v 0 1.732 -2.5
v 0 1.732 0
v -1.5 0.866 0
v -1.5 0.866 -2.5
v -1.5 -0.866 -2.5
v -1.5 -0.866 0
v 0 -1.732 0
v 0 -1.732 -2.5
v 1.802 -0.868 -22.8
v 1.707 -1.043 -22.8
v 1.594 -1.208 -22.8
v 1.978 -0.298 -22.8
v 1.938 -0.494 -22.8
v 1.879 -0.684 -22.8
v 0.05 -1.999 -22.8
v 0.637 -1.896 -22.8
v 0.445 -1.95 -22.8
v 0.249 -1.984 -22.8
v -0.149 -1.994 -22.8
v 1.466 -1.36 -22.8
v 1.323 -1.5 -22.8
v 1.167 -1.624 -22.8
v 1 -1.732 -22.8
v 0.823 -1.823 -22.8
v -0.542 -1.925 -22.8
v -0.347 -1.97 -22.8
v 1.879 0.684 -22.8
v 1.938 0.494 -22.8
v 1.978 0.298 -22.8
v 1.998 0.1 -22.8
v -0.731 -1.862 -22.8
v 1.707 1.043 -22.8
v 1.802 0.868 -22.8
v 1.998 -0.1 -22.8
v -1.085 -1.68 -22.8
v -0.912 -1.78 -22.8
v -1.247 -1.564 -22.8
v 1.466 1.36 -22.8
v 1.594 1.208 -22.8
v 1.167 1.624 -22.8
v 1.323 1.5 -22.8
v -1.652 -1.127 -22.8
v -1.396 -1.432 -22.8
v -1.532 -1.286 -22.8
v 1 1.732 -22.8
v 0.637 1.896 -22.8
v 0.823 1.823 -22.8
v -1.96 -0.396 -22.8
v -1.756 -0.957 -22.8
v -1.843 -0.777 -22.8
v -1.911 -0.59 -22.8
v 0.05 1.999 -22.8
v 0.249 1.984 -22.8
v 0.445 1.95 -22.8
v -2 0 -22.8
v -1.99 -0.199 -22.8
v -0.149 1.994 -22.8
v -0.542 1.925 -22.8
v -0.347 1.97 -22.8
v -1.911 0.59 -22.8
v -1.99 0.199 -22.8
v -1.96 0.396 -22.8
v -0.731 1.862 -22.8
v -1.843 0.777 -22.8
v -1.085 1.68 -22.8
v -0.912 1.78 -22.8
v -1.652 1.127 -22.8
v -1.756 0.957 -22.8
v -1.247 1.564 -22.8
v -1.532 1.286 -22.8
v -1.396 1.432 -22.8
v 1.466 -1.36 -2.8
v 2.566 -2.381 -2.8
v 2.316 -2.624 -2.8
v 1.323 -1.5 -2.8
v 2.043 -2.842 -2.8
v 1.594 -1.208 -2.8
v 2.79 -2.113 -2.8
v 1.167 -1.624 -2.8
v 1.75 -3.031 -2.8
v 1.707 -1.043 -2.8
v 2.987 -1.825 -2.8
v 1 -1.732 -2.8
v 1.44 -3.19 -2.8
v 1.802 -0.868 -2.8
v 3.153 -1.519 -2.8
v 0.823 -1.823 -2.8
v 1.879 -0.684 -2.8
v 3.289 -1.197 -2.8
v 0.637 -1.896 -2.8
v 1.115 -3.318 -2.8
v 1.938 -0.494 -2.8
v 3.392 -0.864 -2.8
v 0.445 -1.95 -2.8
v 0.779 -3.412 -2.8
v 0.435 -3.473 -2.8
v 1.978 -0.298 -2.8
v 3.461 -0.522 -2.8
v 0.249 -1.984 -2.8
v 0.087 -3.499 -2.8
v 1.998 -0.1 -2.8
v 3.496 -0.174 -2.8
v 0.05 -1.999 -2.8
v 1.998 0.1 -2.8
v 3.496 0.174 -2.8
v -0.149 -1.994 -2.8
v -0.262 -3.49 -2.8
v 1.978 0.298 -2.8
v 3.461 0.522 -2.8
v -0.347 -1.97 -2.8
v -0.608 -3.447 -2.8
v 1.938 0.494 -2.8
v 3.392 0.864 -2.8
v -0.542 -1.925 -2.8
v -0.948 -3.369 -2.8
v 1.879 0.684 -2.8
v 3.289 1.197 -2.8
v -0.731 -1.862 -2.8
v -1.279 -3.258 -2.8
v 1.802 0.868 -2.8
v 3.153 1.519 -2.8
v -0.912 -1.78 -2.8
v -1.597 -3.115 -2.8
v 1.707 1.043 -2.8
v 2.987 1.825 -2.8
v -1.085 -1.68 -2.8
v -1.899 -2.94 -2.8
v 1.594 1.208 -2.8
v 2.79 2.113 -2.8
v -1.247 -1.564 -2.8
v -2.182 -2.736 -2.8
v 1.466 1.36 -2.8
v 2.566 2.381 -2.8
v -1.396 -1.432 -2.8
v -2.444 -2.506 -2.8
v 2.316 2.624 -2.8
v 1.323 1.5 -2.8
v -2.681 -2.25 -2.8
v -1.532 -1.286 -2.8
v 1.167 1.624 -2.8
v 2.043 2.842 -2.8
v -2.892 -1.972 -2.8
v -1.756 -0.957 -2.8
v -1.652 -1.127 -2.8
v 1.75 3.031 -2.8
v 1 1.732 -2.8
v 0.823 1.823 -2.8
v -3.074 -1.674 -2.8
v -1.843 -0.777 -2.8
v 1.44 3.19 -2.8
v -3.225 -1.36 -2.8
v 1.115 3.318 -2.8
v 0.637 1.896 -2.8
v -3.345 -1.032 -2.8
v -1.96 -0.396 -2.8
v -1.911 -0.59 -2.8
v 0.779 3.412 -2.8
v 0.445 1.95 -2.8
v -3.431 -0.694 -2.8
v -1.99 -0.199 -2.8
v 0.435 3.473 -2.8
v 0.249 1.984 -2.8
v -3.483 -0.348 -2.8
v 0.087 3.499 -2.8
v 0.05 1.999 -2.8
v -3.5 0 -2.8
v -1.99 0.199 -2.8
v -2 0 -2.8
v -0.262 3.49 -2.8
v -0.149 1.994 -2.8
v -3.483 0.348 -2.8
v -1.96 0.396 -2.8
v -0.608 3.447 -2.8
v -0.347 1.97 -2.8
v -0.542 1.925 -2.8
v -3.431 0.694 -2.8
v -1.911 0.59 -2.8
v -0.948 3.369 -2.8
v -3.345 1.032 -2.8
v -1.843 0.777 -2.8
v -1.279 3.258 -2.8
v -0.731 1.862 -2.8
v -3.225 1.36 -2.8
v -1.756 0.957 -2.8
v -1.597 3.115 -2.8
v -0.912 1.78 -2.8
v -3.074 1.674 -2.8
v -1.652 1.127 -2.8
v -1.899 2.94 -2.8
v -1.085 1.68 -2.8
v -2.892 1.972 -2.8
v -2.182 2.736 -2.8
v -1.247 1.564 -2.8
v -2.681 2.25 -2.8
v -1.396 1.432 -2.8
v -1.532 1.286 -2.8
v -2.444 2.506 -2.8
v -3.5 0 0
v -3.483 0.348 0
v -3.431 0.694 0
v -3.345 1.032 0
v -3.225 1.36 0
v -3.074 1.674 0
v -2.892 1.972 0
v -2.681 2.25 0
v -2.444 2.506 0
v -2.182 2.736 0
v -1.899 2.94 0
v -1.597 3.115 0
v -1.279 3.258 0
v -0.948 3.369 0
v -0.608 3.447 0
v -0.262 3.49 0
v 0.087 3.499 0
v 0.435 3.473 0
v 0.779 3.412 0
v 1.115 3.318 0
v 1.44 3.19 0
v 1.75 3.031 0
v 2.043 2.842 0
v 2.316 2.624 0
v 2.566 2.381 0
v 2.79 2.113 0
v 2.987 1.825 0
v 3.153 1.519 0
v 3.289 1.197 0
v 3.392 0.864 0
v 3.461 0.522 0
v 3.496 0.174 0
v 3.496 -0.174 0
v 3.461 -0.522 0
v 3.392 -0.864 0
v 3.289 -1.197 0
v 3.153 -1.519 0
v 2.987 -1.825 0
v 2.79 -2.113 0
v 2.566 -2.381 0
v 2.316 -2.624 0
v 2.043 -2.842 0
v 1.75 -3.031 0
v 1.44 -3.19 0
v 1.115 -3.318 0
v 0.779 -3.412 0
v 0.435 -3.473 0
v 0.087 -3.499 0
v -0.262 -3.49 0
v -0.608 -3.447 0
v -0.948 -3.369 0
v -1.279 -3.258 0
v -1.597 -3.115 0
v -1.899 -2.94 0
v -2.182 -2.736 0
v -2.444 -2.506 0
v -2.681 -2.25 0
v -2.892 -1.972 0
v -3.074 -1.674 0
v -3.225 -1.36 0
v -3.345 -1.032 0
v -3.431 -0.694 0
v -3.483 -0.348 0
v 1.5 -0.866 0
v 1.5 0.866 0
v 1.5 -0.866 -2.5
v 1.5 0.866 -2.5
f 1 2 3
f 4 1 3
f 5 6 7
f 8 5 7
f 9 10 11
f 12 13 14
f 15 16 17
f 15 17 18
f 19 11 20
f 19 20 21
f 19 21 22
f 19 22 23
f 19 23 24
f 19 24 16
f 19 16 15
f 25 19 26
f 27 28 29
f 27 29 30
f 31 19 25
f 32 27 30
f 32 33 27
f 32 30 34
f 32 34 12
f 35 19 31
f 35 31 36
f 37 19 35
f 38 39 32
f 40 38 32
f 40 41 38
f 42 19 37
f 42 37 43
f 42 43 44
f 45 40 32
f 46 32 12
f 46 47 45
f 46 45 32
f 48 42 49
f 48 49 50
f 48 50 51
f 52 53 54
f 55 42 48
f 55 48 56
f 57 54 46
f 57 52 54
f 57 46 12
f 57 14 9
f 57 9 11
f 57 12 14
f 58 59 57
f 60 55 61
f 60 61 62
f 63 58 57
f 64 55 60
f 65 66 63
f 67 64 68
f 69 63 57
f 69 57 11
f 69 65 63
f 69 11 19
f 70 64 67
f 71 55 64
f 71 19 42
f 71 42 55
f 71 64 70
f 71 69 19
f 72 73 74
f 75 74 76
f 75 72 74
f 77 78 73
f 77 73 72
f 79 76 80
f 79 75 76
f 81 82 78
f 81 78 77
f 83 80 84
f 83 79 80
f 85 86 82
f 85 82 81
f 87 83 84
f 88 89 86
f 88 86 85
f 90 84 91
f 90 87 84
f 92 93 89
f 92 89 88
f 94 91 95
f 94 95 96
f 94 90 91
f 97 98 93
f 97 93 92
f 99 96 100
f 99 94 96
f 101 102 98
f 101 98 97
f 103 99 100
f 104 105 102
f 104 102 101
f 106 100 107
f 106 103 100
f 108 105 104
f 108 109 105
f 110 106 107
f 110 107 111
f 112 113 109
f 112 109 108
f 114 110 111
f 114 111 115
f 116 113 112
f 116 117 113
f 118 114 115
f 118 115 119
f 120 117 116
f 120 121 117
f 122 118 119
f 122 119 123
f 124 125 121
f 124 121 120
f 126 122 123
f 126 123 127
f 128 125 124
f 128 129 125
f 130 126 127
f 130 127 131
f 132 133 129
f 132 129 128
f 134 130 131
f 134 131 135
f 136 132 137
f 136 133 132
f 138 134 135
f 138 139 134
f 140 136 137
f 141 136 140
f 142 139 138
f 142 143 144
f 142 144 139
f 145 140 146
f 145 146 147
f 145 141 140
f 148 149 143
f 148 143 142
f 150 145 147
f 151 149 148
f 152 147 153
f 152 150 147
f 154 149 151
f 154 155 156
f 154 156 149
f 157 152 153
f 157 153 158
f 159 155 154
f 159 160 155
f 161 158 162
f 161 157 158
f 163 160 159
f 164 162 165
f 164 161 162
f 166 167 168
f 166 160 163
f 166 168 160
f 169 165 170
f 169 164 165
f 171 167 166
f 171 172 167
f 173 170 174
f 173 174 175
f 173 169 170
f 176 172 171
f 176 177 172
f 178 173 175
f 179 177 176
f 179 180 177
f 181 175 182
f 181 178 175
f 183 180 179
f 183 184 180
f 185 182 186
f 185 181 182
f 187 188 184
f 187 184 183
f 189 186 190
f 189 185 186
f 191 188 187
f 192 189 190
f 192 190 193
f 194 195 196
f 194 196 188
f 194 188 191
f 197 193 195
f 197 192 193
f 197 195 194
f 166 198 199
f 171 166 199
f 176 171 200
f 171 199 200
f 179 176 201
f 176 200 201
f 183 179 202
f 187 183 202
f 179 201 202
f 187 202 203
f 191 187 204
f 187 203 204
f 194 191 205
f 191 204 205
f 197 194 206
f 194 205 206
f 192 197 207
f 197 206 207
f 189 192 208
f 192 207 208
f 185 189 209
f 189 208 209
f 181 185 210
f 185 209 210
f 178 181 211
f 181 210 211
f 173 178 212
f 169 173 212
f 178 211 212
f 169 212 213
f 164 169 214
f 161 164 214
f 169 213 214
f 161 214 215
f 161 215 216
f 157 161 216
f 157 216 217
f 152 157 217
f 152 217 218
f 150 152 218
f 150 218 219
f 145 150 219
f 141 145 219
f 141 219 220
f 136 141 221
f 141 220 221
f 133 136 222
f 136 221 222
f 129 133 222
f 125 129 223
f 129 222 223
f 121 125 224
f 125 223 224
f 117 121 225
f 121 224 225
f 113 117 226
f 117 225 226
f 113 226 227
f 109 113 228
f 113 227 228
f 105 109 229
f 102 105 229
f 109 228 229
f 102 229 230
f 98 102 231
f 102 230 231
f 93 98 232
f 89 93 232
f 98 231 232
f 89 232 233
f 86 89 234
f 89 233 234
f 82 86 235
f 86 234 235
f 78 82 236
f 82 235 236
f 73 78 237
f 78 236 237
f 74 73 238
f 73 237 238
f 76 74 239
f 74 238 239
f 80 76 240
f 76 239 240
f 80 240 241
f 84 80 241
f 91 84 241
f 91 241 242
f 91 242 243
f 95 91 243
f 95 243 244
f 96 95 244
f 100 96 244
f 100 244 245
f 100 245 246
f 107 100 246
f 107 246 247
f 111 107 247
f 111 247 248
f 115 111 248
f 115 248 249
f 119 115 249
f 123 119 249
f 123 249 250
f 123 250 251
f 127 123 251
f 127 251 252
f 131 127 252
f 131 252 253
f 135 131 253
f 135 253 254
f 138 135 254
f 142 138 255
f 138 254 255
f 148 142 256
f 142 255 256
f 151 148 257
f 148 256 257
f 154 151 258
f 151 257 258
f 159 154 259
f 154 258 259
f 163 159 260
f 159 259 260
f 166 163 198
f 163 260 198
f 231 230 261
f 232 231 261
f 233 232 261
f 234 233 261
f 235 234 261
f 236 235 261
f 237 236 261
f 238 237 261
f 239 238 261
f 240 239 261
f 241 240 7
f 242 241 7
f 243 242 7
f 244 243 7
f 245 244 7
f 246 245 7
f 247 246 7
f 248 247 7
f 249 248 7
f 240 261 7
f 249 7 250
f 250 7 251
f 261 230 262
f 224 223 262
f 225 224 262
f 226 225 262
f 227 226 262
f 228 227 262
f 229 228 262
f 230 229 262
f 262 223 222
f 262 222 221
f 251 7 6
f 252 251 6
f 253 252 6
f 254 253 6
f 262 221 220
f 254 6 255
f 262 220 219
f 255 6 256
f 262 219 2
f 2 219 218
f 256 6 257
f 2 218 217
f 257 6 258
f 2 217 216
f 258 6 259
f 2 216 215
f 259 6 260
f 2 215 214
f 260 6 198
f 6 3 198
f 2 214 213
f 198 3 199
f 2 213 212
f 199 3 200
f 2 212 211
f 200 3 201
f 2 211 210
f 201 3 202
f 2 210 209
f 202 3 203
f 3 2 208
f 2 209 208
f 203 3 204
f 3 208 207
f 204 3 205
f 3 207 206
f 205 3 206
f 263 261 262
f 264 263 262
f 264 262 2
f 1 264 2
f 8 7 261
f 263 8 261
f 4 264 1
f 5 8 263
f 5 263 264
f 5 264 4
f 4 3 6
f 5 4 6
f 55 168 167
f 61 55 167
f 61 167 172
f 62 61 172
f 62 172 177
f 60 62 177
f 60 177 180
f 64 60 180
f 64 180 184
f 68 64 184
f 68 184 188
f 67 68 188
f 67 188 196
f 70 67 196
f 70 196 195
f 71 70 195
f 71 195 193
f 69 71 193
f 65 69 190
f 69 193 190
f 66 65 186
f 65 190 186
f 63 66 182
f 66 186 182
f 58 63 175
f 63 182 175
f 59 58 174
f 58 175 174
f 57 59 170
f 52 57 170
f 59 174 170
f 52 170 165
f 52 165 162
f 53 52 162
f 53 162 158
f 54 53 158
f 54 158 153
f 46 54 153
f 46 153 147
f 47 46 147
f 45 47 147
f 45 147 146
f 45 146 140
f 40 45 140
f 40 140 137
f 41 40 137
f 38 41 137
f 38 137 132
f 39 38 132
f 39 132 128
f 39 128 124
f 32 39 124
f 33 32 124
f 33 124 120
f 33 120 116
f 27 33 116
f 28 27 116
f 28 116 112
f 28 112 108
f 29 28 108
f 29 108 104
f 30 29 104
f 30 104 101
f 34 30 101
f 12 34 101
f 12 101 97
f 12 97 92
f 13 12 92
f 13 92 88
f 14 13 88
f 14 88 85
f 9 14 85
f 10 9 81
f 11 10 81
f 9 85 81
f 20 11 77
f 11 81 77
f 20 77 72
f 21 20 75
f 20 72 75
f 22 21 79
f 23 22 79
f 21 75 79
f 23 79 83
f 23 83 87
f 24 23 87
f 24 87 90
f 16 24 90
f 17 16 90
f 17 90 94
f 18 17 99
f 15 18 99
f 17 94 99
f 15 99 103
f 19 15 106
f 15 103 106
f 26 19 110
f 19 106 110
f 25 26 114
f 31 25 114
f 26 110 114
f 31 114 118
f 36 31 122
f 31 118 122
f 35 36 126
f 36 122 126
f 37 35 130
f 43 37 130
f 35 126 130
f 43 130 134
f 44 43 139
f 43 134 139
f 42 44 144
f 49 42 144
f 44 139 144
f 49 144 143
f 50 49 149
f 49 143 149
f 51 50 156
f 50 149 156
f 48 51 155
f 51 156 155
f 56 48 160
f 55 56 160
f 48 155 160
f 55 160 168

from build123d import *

# Parameters (mm, degrees)
CYLINDER024_R                      = 2
CYLINDER024_DEPTH                  = 22.8
CYLINDER023_R                      = 3.5
CYLINDER023_DEPTH                  = 2.8
FUSION001018017022_PLACEMENT_ANGLE = 180
POCKET002018004005005_DEPTH        = 2.5


with BuildPart() as cylinder024:
    # Cylinder024 → Cylinder024 (new body)
    with BuildSketch(Plane.XY):
        Circle(CYLINDER024_R)
    extrude(amount=CYLINDER024_DEPTH)


with BuildPart() as zylinderkopfschraube_m4x20_isk:
    # Cylinder023 → Cylinder023 (new body)
    with BuildSketch(Plane.XY):
        Circle(CYLINDER023_R)
    extrude(amount=CYLINDER023_DEPTH)

    # Fusion001018017022: union Cylinder024
    add(cylinder024.part)


with BuildPart() as zylinderkopfschraube_m4x20_isk_1:
    # Fusion001018017022 placement: moved
    add(zylinderkopfschraube_m4x20_isk.part.rotate(Axis((0, 0, 0), (0, 1, 0)), FUSION001018017022_PLACEMENT_ANGLE))

    # Sketch023 → Pocket002018004005005 (cut)
    with BuildSketch(Plane(origin=(0, 0, 0), x_dir=(-1, 0, 0), z_dir=(0, 0, 1))):
        Polygon((1.5, -0.866025), (1.5, 0.866025), (0, 1.732051), (-1.5, 0.866025), (-1.5, -0.866025), (0, -1.732051), align=None)
    extrude(amount=-POCKET002018004005005_DEPTH, mode=Mode.SUBTRACT)


solid = zylinderkopfschraube_m4x20_isk_1.part
